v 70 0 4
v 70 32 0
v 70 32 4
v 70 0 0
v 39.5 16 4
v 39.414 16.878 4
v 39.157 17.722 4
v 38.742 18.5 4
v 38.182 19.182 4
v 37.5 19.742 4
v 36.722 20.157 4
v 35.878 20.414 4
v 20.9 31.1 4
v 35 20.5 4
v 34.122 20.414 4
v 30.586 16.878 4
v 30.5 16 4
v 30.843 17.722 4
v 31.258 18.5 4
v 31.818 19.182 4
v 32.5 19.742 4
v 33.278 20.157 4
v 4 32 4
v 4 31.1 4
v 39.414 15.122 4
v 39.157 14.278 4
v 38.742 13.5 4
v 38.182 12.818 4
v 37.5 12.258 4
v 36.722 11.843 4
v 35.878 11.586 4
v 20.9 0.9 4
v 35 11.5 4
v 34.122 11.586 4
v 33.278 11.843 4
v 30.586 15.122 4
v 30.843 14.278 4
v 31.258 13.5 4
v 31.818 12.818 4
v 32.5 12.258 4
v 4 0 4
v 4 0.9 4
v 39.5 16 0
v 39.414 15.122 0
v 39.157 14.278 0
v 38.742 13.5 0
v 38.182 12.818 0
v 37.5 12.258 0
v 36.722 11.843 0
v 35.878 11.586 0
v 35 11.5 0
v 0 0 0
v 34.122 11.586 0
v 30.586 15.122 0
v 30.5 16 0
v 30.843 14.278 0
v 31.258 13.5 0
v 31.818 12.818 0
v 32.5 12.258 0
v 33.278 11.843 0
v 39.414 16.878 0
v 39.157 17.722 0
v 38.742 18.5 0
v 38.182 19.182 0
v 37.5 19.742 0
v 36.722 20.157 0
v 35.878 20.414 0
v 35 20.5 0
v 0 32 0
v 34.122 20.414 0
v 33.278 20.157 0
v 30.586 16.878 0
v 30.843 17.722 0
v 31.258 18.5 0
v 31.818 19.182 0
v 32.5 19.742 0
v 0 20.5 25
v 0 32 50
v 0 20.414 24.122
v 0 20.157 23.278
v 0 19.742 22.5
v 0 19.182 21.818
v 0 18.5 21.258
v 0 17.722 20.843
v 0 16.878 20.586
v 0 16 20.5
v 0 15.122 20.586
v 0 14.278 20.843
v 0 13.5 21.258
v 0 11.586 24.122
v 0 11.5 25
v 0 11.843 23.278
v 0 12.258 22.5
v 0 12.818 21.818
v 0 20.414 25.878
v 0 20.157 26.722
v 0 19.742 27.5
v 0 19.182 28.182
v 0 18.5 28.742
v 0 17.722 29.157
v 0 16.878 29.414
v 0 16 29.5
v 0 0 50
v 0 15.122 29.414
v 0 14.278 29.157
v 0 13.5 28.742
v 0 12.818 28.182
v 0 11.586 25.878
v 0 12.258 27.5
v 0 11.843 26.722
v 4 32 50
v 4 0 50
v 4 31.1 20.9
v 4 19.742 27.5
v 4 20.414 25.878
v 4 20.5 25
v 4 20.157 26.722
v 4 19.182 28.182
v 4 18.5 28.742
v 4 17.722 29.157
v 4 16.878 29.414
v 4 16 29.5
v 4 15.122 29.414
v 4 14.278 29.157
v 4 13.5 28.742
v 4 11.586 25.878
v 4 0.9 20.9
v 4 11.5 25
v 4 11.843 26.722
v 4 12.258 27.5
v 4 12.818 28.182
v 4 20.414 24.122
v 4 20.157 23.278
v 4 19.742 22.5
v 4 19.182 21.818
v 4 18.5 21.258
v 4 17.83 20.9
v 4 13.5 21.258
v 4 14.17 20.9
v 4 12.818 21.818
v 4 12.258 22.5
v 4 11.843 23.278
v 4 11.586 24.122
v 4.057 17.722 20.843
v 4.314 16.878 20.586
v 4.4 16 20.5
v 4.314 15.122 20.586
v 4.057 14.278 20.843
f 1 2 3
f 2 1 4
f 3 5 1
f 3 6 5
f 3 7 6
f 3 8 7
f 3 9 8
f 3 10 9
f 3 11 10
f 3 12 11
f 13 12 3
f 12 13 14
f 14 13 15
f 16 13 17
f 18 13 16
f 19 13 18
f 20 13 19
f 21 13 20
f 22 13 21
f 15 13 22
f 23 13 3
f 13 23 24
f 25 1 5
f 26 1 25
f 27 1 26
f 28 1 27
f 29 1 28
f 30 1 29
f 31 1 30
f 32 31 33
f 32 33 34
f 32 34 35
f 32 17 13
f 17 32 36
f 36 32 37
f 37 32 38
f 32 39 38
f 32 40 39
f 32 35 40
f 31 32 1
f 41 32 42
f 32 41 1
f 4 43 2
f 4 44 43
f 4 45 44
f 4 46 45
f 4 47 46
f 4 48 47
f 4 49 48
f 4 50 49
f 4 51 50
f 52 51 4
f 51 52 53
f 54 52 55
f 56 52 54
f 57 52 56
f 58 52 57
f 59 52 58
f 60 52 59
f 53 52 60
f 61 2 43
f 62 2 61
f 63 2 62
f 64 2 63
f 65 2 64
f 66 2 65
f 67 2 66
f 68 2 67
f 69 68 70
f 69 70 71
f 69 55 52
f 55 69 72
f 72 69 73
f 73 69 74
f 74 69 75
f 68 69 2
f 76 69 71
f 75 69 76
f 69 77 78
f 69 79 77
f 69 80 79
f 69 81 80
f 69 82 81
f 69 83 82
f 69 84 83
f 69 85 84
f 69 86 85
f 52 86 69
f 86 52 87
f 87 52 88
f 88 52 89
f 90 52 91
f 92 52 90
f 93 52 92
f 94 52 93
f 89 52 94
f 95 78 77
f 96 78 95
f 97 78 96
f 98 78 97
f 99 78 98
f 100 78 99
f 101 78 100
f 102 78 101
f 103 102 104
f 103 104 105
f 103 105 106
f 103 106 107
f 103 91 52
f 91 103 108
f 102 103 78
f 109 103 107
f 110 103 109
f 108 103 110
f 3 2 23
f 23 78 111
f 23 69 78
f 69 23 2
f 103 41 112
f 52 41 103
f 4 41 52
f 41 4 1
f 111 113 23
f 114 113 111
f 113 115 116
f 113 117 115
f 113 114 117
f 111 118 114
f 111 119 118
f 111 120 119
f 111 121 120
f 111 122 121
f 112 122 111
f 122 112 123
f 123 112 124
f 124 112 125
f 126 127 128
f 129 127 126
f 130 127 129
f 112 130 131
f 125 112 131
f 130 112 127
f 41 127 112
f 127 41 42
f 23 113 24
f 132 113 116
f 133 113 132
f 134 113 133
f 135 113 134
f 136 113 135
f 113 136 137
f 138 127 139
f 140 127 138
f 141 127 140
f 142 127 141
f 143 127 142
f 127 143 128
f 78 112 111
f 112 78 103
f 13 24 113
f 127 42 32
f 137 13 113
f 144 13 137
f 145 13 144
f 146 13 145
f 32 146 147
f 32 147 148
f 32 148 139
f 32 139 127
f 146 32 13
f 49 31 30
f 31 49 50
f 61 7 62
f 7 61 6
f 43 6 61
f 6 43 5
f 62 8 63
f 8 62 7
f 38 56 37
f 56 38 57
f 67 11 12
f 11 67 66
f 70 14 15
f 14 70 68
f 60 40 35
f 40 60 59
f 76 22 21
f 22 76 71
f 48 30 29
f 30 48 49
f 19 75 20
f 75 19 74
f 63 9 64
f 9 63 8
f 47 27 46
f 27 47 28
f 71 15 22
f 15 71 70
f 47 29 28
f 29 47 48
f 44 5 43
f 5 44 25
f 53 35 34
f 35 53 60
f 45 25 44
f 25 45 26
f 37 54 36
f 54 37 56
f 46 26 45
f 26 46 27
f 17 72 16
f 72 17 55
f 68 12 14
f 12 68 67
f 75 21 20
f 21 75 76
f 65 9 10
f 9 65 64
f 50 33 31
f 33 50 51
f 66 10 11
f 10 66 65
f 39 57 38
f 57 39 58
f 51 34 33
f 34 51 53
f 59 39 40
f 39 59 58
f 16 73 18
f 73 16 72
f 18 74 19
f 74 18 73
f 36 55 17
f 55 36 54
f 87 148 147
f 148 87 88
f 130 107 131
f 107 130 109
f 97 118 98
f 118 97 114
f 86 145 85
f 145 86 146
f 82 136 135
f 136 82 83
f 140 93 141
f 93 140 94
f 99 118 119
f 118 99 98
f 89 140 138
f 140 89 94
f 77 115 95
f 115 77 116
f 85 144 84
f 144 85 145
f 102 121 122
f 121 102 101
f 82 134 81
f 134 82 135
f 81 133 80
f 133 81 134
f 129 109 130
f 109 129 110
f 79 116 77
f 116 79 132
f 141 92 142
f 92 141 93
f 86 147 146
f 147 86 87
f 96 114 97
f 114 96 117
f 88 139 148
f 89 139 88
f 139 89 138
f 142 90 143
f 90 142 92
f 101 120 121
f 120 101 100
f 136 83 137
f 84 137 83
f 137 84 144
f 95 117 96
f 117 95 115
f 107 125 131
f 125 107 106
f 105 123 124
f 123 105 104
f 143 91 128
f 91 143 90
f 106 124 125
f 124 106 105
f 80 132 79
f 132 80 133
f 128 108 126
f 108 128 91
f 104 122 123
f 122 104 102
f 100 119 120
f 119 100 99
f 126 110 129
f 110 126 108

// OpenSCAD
$fn = 32;

// ----------------------------------------------------------------------
// L-bracket: 70 x 32 x 50 mm
// ----------------------------------------------------------------------

// --- parameters (mm) ---
horiz_len = 70;           // horizontal leg, X
vert_len = 50;            // vertical leg, Z
profile_w = 32;           // bracket depth, Y
plate_t = 4;              // plate thickness
hole_d = 9;               // clearance for M8
rib_leg = 24;             // gusset leg
rib_sink = 0.9;           // gusset overlap into the plates

module hole_z(px, py) {
  translate([px, py, -0.5]) cylinder(h = plate_t + 1, d = hole_d);
}
module hole_x(pz, py) {
  translate([-0.5, py, pz]) rotate([0, 90, 0]) cylinder(h = plate_t + 1, d = hole_d);
}
module gusset() {
  translate([0, profile_w - rib_sink, 0])
    rotate([90, 0, 0])
      linear_extrude(height = profile_w - 2 * rib_sink)
        polygon(points = [[rib_sink, rib_sink], [rib_leg, rib_sink], [rib_sink, rib_leg]]);
}

difference() {
  union() {
    /* horizontal leg */
    cube([horiz_len, profile_w, plate_t]);
    /* vertical leg, overlapping the corner block */
    cube([plate_t, profile_w, vert_len]);
    gusset();
  }
  hole_z(35, 16);
  hole_x(25, 16);
}
